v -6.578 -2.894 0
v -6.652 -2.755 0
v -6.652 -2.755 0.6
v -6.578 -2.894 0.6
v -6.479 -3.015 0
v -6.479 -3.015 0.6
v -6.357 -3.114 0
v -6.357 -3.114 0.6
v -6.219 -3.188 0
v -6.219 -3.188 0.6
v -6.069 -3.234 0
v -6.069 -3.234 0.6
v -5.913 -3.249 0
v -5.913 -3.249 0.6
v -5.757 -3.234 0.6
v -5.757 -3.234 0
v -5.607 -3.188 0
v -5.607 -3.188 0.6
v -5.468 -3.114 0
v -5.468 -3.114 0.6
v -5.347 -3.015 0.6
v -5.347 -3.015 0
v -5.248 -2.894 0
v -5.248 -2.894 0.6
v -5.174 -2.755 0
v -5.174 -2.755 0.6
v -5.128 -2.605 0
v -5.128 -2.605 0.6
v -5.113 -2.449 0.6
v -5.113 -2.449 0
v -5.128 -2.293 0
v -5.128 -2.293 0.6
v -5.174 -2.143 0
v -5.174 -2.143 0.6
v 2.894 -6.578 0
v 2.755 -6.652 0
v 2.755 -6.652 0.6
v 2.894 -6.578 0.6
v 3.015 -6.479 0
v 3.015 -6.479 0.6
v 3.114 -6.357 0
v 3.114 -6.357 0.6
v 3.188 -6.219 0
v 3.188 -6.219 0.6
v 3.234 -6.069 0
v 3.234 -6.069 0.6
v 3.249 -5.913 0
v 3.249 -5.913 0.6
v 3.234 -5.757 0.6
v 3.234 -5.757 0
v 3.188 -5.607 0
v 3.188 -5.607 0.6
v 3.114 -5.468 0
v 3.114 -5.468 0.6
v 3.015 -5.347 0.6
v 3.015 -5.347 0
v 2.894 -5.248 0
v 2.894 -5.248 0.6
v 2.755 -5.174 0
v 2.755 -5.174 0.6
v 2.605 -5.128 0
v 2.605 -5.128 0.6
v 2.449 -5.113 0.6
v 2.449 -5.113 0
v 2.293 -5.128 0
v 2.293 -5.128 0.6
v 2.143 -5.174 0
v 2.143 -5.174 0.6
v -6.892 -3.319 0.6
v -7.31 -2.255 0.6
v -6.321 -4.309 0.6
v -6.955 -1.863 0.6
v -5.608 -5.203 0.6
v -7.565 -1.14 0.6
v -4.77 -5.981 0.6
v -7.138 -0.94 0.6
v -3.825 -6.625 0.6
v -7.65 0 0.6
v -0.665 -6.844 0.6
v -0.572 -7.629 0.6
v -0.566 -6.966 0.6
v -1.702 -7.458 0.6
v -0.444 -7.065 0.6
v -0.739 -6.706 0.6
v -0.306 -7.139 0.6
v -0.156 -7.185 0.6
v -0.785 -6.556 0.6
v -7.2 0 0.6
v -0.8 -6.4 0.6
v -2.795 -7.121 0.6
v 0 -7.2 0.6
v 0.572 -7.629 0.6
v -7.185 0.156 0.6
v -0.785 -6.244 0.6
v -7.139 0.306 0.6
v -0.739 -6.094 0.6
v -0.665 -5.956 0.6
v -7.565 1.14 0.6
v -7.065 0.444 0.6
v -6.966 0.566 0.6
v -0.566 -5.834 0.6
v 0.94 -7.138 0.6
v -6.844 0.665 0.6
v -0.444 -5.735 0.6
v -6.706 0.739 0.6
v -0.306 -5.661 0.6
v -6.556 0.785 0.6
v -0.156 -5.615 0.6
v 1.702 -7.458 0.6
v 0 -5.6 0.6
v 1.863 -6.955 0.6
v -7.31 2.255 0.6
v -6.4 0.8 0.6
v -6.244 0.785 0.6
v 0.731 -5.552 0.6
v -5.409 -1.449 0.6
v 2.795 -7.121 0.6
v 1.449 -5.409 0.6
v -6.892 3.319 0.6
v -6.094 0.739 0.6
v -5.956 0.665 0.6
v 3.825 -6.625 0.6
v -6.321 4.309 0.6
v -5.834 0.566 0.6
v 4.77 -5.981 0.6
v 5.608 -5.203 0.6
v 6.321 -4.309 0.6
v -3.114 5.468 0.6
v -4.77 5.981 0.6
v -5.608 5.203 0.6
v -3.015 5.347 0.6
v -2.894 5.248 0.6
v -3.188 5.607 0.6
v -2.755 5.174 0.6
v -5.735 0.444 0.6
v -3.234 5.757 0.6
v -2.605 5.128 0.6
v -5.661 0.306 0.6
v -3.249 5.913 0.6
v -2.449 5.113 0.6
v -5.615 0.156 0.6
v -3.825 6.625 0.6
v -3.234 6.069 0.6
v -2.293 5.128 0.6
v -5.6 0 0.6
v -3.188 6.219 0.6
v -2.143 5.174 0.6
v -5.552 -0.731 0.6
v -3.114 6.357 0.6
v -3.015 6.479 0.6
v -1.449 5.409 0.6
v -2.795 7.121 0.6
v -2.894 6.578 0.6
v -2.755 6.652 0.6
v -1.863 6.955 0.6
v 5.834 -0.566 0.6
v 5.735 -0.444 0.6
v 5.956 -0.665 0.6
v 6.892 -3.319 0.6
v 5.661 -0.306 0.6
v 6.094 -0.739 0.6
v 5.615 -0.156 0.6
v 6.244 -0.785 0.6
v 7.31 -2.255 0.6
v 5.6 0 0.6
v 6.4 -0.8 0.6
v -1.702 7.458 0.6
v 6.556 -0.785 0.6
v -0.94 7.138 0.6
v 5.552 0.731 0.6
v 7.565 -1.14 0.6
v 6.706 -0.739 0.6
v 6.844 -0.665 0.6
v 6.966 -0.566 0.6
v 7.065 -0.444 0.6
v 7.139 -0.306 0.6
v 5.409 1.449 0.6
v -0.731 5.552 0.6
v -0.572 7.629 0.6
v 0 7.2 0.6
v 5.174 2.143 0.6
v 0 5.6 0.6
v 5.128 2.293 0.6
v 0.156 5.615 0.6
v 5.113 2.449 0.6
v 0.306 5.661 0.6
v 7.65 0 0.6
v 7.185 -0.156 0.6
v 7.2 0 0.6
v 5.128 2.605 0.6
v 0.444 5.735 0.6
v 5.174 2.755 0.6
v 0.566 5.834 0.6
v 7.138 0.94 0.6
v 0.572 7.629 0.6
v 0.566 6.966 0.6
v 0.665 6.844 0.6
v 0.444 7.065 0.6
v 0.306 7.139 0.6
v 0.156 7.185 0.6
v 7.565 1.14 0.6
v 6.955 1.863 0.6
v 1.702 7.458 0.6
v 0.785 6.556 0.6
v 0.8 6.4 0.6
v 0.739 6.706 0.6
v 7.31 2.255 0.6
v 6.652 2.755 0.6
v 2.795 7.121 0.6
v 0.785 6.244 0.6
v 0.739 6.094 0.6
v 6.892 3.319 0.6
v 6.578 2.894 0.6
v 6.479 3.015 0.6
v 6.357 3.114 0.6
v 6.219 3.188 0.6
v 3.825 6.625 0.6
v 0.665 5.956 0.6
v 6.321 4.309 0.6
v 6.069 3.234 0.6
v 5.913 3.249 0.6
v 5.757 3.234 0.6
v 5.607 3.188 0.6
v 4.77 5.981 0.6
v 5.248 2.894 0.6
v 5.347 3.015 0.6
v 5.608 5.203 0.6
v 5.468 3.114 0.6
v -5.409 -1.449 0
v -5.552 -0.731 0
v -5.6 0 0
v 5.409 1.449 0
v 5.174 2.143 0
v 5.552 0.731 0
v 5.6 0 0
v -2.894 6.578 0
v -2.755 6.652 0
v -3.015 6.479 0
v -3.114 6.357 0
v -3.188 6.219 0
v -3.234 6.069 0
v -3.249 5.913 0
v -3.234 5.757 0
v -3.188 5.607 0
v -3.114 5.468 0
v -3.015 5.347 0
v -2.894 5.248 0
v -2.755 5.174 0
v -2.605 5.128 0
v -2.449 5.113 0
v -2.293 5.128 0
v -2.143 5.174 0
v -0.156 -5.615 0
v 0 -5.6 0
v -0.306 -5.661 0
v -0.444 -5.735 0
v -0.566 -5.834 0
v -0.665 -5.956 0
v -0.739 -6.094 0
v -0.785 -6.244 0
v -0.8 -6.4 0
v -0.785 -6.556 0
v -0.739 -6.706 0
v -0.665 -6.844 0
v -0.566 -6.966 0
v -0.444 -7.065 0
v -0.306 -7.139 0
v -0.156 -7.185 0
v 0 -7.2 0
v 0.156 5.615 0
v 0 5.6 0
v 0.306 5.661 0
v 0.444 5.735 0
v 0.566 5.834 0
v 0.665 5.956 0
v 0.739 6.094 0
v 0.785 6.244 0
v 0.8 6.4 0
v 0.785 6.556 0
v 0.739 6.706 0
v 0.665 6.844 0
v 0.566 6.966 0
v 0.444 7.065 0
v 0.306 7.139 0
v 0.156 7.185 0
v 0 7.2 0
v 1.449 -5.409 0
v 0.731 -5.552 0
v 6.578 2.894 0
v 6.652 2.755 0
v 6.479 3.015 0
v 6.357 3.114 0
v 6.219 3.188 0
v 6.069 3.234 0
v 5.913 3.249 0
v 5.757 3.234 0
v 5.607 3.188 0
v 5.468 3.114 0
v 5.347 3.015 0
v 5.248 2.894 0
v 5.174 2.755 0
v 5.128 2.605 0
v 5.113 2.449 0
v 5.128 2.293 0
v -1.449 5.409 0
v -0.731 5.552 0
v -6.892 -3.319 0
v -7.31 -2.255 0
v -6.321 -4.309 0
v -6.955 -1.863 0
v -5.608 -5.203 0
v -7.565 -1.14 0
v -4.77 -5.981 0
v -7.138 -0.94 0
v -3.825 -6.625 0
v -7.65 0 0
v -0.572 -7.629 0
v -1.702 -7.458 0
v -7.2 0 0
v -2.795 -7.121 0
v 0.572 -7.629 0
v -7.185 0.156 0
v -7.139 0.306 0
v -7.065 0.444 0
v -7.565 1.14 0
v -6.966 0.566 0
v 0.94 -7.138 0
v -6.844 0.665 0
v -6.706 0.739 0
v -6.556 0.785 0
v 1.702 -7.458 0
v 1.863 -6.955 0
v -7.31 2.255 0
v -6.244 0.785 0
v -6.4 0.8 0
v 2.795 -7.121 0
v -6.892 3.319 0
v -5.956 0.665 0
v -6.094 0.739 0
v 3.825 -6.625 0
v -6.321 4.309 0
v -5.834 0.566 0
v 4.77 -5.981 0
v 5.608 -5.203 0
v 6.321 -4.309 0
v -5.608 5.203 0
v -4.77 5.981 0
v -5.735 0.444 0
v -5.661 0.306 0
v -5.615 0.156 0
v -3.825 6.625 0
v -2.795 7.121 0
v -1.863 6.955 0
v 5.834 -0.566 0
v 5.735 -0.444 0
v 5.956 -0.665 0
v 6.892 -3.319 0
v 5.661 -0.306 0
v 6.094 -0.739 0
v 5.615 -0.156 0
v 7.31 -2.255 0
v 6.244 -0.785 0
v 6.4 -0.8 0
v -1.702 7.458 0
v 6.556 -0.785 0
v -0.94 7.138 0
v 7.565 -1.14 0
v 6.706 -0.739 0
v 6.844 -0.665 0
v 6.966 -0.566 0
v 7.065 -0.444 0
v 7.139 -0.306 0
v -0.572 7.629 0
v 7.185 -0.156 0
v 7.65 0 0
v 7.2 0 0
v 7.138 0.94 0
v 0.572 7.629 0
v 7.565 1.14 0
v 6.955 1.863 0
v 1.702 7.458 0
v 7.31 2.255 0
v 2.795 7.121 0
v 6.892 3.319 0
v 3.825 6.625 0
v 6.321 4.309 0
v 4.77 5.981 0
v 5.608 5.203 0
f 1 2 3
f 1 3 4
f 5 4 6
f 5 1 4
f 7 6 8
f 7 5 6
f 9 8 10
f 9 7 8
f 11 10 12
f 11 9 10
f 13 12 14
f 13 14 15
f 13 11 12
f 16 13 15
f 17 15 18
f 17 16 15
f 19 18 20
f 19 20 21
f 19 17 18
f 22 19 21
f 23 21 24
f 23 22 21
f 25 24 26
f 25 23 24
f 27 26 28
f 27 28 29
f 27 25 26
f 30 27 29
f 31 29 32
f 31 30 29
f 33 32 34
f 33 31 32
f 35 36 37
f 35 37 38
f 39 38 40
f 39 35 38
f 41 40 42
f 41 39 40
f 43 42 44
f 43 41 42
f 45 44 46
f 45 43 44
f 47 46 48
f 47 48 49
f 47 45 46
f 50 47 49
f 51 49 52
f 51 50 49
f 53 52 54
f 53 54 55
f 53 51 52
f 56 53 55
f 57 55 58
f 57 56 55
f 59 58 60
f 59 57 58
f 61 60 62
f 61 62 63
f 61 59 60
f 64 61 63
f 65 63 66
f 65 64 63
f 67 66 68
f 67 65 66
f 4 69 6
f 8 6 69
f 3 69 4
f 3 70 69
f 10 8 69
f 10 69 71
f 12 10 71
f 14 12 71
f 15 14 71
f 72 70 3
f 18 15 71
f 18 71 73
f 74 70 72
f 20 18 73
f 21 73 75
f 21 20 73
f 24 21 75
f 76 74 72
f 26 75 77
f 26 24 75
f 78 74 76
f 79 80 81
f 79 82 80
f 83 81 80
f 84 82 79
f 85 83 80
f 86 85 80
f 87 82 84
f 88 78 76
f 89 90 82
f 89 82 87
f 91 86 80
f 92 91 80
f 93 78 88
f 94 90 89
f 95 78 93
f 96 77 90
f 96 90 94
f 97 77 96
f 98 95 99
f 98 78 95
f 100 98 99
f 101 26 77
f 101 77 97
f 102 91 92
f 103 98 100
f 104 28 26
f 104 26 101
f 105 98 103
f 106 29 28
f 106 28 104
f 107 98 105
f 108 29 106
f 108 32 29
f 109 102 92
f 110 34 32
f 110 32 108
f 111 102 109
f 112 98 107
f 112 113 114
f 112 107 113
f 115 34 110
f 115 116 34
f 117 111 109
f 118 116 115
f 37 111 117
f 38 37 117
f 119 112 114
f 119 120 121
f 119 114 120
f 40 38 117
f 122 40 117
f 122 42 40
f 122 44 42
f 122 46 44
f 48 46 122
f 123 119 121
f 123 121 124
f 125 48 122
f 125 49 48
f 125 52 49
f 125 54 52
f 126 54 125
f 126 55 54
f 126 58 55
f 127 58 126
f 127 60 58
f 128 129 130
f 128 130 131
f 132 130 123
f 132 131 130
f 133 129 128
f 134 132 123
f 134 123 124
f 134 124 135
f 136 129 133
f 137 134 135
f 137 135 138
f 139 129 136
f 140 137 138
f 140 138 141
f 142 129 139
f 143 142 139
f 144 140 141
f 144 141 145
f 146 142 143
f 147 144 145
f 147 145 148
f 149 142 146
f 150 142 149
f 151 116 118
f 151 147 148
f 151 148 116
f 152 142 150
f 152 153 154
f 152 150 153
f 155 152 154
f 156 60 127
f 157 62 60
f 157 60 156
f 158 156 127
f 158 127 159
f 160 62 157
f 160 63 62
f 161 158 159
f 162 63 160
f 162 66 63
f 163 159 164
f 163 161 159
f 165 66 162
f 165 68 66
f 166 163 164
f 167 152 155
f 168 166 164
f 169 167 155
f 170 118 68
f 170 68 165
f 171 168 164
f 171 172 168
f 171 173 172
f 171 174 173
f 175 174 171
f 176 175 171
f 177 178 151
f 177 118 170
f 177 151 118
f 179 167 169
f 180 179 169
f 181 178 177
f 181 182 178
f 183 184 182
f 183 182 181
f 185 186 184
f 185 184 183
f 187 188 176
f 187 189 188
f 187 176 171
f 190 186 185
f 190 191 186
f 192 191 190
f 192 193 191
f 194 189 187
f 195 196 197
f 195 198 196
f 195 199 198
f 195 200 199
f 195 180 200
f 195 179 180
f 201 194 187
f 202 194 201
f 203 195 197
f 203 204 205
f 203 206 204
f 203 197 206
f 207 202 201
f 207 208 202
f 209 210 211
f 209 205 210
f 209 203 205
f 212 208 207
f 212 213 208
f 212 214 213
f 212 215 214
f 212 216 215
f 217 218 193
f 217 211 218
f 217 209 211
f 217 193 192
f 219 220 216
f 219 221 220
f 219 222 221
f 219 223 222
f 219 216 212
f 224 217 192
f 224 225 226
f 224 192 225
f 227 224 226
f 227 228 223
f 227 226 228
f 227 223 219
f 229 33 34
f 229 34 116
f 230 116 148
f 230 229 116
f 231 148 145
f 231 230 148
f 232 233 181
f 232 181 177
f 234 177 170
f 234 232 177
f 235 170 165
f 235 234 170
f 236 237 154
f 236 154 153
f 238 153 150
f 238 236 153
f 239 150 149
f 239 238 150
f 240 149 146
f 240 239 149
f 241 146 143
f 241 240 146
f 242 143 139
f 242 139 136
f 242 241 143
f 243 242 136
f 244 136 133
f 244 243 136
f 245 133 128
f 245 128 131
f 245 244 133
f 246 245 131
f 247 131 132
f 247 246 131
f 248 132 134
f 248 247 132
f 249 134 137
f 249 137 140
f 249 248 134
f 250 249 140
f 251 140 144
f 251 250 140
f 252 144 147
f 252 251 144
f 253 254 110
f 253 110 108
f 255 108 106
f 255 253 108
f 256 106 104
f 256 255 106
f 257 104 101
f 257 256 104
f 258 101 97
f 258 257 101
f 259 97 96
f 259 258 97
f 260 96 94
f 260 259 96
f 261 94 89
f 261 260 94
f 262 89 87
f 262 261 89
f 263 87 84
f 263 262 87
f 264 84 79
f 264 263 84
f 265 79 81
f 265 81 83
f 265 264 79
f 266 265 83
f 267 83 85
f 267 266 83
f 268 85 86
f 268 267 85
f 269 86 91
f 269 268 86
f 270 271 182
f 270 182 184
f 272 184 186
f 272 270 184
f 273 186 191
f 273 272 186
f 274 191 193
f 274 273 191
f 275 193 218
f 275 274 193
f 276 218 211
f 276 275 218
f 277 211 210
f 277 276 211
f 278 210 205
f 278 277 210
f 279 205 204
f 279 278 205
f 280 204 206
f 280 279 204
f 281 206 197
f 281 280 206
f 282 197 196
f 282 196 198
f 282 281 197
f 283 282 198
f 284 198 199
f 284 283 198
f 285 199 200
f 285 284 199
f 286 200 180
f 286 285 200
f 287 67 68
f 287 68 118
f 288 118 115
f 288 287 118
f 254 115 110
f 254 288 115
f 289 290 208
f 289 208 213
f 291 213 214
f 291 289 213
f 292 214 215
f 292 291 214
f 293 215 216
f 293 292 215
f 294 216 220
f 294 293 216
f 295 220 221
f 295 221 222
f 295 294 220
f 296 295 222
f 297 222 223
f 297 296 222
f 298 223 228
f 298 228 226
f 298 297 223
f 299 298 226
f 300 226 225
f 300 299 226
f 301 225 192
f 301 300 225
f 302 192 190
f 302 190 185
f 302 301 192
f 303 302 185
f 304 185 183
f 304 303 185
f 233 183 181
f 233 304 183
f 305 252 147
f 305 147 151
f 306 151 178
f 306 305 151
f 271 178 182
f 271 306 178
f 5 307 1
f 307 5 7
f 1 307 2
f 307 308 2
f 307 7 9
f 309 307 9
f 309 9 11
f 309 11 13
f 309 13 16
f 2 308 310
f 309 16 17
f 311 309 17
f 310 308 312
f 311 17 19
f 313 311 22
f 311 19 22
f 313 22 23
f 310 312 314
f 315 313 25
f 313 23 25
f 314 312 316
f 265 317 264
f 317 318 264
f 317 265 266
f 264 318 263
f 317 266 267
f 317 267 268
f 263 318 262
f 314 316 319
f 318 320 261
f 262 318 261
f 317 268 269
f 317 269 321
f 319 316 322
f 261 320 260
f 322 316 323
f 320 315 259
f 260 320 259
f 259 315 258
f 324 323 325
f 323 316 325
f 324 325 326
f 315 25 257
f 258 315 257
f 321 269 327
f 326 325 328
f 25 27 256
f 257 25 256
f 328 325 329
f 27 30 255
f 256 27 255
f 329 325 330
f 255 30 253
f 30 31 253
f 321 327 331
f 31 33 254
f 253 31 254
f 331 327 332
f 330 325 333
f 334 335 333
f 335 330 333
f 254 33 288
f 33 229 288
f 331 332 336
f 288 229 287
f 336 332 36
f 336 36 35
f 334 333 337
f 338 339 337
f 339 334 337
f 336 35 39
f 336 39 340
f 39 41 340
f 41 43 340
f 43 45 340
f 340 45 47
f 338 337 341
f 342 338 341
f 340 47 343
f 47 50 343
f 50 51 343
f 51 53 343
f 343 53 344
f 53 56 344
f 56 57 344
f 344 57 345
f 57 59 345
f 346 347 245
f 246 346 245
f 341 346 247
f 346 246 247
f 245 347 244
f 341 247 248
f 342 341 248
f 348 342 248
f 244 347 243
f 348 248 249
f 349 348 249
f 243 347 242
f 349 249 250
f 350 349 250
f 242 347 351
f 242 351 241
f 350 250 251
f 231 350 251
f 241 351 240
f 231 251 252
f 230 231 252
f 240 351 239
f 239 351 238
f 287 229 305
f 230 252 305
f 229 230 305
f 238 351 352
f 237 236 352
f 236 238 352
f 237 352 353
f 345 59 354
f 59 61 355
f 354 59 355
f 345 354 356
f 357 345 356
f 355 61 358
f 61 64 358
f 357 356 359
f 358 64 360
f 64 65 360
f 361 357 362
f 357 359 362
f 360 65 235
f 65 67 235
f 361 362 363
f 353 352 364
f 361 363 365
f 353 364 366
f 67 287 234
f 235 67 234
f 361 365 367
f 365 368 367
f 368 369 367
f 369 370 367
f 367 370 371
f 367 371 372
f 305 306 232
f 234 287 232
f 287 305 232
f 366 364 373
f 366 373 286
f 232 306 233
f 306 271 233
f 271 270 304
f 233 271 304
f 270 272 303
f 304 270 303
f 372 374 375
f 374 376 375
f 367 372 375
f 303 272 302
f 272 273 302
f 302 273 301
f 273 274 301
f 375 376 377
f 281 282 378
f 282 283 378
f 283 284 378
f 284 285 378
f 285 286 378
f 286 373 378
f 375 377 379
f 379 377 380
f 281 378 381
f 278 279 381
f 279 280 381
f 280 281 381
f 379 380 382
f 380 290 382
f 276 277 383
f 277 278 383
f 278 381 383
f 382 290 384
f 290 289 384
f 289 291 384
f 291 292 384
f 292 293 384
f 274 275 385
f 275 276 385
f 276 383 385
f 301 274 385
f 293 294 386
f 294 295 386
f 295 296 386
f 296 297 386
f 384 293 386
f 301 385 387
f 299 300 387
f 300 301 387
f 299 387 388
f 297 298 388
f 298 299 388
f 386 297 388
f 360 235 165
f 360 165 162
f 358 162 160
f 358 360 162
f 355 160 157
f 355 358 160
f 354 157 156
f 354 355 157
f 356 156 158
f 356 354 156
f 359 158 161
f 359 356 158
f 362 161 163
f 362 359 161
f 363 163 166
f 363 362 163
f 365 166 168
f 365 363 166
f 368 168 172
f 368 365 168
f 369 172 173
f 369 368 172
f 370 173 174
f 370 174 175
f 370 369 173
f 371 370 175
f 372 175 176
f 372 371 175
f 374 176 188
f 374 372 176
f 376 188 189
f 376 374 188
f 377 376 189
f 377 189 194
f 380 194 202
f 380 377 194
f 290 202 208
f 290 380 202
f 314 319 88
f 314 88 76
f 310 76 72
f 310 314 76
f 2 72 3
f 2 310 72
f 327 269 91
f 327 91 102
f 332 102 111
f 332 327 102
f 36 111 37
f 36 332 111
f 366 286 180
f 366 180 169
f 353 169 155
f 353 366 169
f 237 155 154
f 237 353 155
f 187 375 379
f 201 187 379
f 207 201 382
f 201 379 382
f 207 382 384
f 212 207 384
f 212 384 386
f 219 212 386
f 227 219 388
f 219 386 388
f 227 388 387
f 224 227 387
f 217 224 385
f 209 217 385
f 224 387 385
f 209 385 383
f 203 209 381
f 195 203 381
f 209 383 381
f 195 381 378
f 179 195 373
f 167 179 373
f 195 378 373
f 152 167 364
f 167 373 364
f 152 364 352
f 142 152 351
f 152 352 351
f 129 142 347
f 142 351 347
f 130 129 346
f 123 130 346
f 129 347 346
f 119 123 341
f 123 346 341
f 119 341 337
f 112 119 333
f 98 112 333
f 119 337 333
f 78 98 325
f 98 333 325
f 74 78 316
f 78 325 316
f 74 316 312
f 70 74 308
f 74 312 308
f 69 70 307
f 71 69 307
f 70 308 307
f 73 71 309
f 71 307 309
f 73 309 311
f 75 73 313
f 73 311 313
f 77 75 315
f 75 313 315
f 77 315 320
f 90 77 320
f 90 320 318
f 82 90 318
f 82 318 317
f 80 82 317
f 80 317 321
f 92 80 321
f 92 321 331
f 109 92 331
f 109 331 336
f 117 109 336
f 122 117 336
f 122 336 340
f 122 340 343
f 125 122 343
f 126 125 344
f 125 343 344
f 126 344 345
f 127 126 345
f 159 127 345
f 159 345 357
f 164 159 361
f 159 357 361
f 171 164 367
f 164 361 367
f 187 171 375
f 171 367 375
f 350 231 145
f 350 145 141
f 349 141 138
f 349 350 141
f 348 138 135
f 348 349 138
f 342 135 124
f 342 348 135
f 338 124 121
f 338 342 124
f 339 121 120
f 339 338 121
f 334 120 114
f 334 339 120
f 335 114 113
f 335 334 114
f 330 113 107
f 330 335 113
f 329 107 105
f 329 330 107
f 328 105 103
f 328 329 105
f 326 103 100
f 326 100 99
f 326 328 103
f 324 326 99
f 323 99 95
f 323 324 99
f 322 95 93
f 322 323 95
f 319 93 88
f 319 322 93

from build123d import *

# Parameters (mm, degrees)
SKETCH1_R           = 7.65
BOSS_EXTRUDE1_DEPTH = 0.6


with BuildPart() as part:
    # Sketch1 → Boss-Extrude1 (new body)
    with BuildSketch(Plane.XY):
        Circle(SKETCH1_R)
        with BuildLine():
            ThreePointArc((0, 5.6), (0.8, 6.4), (0, 7.2))
            ThreePointArc((0, 7.2), (-1.404650319, 7.061654019), (-2.755320713, 6.651932634))
            ThreePointArc((-2.755320713, 6.651932634), (-3.188277593, 5.606682262), (-2.143027221, 5.173725382))
            ThreePointArc((-2.143027221, 5.173725382), (-1.092505803, 5.49239757), (0, 5.6))
        make_face(mode=Mode.SUBTRACT)
        with BuildLine():
            ThreePointArc((6.651932634, 2.755320713), (5.606682262, 3.188277593), (5.173725382, 2.143027221))
            ThreePointArc((5.173725382, 2.143027221), (5.49239757, 1.092505803), (5.6, 0))
            ThreePointArc((5.6, 0), (6.4, -0.8), (7.2, 0))
            ThreePointArc((7.2, 0), (7.061654019, 1.404650319), (6.651932634, 2.755320713))
        make_face(mode=Mode.SUBTRACT)
        with BuildLine():
            ThreePointArc((2.755320713, -6.651932634), (3.188277593, -5.606682262), (2.143027221, -5.173725382))
            ThreePointArc((2.143027221, -5.173725382), (1.092505803, -5.49239757), (0, -5.6))
            ThreePointArc((0, -5.6), (-0.8, -6.4), (0, -7.2))
            ThreePointArc((0, -7.2), (1.404650319, -7.061654019), (2.755320713, -6.651932634))
        make_face(mode=Mode.SUBTRACT)
        with BuildLine():
            ThreePointArc((-6.651932634, -2.755320713), (-5.606682262, -3.188277593), (-5.173725382, -2.143027221))
            ThreePointArc((-5.173725382, -2.143027221), (-5.49239757, -1.092505803), (-5.6, 0))
            ThreePointArc((-5.6, 0), (-6.4, 0.8), (-7.2, 0))
            ThreePointArc((-7.2, 0), (-7.061654019, -1.404650319), (-6.651932634, -2.755320713))
        make_face(mode=Mode.SUBTRACT)
    extrude(amount=BOSS_EXTRUDE1_DEPTH)


solid = part.part
